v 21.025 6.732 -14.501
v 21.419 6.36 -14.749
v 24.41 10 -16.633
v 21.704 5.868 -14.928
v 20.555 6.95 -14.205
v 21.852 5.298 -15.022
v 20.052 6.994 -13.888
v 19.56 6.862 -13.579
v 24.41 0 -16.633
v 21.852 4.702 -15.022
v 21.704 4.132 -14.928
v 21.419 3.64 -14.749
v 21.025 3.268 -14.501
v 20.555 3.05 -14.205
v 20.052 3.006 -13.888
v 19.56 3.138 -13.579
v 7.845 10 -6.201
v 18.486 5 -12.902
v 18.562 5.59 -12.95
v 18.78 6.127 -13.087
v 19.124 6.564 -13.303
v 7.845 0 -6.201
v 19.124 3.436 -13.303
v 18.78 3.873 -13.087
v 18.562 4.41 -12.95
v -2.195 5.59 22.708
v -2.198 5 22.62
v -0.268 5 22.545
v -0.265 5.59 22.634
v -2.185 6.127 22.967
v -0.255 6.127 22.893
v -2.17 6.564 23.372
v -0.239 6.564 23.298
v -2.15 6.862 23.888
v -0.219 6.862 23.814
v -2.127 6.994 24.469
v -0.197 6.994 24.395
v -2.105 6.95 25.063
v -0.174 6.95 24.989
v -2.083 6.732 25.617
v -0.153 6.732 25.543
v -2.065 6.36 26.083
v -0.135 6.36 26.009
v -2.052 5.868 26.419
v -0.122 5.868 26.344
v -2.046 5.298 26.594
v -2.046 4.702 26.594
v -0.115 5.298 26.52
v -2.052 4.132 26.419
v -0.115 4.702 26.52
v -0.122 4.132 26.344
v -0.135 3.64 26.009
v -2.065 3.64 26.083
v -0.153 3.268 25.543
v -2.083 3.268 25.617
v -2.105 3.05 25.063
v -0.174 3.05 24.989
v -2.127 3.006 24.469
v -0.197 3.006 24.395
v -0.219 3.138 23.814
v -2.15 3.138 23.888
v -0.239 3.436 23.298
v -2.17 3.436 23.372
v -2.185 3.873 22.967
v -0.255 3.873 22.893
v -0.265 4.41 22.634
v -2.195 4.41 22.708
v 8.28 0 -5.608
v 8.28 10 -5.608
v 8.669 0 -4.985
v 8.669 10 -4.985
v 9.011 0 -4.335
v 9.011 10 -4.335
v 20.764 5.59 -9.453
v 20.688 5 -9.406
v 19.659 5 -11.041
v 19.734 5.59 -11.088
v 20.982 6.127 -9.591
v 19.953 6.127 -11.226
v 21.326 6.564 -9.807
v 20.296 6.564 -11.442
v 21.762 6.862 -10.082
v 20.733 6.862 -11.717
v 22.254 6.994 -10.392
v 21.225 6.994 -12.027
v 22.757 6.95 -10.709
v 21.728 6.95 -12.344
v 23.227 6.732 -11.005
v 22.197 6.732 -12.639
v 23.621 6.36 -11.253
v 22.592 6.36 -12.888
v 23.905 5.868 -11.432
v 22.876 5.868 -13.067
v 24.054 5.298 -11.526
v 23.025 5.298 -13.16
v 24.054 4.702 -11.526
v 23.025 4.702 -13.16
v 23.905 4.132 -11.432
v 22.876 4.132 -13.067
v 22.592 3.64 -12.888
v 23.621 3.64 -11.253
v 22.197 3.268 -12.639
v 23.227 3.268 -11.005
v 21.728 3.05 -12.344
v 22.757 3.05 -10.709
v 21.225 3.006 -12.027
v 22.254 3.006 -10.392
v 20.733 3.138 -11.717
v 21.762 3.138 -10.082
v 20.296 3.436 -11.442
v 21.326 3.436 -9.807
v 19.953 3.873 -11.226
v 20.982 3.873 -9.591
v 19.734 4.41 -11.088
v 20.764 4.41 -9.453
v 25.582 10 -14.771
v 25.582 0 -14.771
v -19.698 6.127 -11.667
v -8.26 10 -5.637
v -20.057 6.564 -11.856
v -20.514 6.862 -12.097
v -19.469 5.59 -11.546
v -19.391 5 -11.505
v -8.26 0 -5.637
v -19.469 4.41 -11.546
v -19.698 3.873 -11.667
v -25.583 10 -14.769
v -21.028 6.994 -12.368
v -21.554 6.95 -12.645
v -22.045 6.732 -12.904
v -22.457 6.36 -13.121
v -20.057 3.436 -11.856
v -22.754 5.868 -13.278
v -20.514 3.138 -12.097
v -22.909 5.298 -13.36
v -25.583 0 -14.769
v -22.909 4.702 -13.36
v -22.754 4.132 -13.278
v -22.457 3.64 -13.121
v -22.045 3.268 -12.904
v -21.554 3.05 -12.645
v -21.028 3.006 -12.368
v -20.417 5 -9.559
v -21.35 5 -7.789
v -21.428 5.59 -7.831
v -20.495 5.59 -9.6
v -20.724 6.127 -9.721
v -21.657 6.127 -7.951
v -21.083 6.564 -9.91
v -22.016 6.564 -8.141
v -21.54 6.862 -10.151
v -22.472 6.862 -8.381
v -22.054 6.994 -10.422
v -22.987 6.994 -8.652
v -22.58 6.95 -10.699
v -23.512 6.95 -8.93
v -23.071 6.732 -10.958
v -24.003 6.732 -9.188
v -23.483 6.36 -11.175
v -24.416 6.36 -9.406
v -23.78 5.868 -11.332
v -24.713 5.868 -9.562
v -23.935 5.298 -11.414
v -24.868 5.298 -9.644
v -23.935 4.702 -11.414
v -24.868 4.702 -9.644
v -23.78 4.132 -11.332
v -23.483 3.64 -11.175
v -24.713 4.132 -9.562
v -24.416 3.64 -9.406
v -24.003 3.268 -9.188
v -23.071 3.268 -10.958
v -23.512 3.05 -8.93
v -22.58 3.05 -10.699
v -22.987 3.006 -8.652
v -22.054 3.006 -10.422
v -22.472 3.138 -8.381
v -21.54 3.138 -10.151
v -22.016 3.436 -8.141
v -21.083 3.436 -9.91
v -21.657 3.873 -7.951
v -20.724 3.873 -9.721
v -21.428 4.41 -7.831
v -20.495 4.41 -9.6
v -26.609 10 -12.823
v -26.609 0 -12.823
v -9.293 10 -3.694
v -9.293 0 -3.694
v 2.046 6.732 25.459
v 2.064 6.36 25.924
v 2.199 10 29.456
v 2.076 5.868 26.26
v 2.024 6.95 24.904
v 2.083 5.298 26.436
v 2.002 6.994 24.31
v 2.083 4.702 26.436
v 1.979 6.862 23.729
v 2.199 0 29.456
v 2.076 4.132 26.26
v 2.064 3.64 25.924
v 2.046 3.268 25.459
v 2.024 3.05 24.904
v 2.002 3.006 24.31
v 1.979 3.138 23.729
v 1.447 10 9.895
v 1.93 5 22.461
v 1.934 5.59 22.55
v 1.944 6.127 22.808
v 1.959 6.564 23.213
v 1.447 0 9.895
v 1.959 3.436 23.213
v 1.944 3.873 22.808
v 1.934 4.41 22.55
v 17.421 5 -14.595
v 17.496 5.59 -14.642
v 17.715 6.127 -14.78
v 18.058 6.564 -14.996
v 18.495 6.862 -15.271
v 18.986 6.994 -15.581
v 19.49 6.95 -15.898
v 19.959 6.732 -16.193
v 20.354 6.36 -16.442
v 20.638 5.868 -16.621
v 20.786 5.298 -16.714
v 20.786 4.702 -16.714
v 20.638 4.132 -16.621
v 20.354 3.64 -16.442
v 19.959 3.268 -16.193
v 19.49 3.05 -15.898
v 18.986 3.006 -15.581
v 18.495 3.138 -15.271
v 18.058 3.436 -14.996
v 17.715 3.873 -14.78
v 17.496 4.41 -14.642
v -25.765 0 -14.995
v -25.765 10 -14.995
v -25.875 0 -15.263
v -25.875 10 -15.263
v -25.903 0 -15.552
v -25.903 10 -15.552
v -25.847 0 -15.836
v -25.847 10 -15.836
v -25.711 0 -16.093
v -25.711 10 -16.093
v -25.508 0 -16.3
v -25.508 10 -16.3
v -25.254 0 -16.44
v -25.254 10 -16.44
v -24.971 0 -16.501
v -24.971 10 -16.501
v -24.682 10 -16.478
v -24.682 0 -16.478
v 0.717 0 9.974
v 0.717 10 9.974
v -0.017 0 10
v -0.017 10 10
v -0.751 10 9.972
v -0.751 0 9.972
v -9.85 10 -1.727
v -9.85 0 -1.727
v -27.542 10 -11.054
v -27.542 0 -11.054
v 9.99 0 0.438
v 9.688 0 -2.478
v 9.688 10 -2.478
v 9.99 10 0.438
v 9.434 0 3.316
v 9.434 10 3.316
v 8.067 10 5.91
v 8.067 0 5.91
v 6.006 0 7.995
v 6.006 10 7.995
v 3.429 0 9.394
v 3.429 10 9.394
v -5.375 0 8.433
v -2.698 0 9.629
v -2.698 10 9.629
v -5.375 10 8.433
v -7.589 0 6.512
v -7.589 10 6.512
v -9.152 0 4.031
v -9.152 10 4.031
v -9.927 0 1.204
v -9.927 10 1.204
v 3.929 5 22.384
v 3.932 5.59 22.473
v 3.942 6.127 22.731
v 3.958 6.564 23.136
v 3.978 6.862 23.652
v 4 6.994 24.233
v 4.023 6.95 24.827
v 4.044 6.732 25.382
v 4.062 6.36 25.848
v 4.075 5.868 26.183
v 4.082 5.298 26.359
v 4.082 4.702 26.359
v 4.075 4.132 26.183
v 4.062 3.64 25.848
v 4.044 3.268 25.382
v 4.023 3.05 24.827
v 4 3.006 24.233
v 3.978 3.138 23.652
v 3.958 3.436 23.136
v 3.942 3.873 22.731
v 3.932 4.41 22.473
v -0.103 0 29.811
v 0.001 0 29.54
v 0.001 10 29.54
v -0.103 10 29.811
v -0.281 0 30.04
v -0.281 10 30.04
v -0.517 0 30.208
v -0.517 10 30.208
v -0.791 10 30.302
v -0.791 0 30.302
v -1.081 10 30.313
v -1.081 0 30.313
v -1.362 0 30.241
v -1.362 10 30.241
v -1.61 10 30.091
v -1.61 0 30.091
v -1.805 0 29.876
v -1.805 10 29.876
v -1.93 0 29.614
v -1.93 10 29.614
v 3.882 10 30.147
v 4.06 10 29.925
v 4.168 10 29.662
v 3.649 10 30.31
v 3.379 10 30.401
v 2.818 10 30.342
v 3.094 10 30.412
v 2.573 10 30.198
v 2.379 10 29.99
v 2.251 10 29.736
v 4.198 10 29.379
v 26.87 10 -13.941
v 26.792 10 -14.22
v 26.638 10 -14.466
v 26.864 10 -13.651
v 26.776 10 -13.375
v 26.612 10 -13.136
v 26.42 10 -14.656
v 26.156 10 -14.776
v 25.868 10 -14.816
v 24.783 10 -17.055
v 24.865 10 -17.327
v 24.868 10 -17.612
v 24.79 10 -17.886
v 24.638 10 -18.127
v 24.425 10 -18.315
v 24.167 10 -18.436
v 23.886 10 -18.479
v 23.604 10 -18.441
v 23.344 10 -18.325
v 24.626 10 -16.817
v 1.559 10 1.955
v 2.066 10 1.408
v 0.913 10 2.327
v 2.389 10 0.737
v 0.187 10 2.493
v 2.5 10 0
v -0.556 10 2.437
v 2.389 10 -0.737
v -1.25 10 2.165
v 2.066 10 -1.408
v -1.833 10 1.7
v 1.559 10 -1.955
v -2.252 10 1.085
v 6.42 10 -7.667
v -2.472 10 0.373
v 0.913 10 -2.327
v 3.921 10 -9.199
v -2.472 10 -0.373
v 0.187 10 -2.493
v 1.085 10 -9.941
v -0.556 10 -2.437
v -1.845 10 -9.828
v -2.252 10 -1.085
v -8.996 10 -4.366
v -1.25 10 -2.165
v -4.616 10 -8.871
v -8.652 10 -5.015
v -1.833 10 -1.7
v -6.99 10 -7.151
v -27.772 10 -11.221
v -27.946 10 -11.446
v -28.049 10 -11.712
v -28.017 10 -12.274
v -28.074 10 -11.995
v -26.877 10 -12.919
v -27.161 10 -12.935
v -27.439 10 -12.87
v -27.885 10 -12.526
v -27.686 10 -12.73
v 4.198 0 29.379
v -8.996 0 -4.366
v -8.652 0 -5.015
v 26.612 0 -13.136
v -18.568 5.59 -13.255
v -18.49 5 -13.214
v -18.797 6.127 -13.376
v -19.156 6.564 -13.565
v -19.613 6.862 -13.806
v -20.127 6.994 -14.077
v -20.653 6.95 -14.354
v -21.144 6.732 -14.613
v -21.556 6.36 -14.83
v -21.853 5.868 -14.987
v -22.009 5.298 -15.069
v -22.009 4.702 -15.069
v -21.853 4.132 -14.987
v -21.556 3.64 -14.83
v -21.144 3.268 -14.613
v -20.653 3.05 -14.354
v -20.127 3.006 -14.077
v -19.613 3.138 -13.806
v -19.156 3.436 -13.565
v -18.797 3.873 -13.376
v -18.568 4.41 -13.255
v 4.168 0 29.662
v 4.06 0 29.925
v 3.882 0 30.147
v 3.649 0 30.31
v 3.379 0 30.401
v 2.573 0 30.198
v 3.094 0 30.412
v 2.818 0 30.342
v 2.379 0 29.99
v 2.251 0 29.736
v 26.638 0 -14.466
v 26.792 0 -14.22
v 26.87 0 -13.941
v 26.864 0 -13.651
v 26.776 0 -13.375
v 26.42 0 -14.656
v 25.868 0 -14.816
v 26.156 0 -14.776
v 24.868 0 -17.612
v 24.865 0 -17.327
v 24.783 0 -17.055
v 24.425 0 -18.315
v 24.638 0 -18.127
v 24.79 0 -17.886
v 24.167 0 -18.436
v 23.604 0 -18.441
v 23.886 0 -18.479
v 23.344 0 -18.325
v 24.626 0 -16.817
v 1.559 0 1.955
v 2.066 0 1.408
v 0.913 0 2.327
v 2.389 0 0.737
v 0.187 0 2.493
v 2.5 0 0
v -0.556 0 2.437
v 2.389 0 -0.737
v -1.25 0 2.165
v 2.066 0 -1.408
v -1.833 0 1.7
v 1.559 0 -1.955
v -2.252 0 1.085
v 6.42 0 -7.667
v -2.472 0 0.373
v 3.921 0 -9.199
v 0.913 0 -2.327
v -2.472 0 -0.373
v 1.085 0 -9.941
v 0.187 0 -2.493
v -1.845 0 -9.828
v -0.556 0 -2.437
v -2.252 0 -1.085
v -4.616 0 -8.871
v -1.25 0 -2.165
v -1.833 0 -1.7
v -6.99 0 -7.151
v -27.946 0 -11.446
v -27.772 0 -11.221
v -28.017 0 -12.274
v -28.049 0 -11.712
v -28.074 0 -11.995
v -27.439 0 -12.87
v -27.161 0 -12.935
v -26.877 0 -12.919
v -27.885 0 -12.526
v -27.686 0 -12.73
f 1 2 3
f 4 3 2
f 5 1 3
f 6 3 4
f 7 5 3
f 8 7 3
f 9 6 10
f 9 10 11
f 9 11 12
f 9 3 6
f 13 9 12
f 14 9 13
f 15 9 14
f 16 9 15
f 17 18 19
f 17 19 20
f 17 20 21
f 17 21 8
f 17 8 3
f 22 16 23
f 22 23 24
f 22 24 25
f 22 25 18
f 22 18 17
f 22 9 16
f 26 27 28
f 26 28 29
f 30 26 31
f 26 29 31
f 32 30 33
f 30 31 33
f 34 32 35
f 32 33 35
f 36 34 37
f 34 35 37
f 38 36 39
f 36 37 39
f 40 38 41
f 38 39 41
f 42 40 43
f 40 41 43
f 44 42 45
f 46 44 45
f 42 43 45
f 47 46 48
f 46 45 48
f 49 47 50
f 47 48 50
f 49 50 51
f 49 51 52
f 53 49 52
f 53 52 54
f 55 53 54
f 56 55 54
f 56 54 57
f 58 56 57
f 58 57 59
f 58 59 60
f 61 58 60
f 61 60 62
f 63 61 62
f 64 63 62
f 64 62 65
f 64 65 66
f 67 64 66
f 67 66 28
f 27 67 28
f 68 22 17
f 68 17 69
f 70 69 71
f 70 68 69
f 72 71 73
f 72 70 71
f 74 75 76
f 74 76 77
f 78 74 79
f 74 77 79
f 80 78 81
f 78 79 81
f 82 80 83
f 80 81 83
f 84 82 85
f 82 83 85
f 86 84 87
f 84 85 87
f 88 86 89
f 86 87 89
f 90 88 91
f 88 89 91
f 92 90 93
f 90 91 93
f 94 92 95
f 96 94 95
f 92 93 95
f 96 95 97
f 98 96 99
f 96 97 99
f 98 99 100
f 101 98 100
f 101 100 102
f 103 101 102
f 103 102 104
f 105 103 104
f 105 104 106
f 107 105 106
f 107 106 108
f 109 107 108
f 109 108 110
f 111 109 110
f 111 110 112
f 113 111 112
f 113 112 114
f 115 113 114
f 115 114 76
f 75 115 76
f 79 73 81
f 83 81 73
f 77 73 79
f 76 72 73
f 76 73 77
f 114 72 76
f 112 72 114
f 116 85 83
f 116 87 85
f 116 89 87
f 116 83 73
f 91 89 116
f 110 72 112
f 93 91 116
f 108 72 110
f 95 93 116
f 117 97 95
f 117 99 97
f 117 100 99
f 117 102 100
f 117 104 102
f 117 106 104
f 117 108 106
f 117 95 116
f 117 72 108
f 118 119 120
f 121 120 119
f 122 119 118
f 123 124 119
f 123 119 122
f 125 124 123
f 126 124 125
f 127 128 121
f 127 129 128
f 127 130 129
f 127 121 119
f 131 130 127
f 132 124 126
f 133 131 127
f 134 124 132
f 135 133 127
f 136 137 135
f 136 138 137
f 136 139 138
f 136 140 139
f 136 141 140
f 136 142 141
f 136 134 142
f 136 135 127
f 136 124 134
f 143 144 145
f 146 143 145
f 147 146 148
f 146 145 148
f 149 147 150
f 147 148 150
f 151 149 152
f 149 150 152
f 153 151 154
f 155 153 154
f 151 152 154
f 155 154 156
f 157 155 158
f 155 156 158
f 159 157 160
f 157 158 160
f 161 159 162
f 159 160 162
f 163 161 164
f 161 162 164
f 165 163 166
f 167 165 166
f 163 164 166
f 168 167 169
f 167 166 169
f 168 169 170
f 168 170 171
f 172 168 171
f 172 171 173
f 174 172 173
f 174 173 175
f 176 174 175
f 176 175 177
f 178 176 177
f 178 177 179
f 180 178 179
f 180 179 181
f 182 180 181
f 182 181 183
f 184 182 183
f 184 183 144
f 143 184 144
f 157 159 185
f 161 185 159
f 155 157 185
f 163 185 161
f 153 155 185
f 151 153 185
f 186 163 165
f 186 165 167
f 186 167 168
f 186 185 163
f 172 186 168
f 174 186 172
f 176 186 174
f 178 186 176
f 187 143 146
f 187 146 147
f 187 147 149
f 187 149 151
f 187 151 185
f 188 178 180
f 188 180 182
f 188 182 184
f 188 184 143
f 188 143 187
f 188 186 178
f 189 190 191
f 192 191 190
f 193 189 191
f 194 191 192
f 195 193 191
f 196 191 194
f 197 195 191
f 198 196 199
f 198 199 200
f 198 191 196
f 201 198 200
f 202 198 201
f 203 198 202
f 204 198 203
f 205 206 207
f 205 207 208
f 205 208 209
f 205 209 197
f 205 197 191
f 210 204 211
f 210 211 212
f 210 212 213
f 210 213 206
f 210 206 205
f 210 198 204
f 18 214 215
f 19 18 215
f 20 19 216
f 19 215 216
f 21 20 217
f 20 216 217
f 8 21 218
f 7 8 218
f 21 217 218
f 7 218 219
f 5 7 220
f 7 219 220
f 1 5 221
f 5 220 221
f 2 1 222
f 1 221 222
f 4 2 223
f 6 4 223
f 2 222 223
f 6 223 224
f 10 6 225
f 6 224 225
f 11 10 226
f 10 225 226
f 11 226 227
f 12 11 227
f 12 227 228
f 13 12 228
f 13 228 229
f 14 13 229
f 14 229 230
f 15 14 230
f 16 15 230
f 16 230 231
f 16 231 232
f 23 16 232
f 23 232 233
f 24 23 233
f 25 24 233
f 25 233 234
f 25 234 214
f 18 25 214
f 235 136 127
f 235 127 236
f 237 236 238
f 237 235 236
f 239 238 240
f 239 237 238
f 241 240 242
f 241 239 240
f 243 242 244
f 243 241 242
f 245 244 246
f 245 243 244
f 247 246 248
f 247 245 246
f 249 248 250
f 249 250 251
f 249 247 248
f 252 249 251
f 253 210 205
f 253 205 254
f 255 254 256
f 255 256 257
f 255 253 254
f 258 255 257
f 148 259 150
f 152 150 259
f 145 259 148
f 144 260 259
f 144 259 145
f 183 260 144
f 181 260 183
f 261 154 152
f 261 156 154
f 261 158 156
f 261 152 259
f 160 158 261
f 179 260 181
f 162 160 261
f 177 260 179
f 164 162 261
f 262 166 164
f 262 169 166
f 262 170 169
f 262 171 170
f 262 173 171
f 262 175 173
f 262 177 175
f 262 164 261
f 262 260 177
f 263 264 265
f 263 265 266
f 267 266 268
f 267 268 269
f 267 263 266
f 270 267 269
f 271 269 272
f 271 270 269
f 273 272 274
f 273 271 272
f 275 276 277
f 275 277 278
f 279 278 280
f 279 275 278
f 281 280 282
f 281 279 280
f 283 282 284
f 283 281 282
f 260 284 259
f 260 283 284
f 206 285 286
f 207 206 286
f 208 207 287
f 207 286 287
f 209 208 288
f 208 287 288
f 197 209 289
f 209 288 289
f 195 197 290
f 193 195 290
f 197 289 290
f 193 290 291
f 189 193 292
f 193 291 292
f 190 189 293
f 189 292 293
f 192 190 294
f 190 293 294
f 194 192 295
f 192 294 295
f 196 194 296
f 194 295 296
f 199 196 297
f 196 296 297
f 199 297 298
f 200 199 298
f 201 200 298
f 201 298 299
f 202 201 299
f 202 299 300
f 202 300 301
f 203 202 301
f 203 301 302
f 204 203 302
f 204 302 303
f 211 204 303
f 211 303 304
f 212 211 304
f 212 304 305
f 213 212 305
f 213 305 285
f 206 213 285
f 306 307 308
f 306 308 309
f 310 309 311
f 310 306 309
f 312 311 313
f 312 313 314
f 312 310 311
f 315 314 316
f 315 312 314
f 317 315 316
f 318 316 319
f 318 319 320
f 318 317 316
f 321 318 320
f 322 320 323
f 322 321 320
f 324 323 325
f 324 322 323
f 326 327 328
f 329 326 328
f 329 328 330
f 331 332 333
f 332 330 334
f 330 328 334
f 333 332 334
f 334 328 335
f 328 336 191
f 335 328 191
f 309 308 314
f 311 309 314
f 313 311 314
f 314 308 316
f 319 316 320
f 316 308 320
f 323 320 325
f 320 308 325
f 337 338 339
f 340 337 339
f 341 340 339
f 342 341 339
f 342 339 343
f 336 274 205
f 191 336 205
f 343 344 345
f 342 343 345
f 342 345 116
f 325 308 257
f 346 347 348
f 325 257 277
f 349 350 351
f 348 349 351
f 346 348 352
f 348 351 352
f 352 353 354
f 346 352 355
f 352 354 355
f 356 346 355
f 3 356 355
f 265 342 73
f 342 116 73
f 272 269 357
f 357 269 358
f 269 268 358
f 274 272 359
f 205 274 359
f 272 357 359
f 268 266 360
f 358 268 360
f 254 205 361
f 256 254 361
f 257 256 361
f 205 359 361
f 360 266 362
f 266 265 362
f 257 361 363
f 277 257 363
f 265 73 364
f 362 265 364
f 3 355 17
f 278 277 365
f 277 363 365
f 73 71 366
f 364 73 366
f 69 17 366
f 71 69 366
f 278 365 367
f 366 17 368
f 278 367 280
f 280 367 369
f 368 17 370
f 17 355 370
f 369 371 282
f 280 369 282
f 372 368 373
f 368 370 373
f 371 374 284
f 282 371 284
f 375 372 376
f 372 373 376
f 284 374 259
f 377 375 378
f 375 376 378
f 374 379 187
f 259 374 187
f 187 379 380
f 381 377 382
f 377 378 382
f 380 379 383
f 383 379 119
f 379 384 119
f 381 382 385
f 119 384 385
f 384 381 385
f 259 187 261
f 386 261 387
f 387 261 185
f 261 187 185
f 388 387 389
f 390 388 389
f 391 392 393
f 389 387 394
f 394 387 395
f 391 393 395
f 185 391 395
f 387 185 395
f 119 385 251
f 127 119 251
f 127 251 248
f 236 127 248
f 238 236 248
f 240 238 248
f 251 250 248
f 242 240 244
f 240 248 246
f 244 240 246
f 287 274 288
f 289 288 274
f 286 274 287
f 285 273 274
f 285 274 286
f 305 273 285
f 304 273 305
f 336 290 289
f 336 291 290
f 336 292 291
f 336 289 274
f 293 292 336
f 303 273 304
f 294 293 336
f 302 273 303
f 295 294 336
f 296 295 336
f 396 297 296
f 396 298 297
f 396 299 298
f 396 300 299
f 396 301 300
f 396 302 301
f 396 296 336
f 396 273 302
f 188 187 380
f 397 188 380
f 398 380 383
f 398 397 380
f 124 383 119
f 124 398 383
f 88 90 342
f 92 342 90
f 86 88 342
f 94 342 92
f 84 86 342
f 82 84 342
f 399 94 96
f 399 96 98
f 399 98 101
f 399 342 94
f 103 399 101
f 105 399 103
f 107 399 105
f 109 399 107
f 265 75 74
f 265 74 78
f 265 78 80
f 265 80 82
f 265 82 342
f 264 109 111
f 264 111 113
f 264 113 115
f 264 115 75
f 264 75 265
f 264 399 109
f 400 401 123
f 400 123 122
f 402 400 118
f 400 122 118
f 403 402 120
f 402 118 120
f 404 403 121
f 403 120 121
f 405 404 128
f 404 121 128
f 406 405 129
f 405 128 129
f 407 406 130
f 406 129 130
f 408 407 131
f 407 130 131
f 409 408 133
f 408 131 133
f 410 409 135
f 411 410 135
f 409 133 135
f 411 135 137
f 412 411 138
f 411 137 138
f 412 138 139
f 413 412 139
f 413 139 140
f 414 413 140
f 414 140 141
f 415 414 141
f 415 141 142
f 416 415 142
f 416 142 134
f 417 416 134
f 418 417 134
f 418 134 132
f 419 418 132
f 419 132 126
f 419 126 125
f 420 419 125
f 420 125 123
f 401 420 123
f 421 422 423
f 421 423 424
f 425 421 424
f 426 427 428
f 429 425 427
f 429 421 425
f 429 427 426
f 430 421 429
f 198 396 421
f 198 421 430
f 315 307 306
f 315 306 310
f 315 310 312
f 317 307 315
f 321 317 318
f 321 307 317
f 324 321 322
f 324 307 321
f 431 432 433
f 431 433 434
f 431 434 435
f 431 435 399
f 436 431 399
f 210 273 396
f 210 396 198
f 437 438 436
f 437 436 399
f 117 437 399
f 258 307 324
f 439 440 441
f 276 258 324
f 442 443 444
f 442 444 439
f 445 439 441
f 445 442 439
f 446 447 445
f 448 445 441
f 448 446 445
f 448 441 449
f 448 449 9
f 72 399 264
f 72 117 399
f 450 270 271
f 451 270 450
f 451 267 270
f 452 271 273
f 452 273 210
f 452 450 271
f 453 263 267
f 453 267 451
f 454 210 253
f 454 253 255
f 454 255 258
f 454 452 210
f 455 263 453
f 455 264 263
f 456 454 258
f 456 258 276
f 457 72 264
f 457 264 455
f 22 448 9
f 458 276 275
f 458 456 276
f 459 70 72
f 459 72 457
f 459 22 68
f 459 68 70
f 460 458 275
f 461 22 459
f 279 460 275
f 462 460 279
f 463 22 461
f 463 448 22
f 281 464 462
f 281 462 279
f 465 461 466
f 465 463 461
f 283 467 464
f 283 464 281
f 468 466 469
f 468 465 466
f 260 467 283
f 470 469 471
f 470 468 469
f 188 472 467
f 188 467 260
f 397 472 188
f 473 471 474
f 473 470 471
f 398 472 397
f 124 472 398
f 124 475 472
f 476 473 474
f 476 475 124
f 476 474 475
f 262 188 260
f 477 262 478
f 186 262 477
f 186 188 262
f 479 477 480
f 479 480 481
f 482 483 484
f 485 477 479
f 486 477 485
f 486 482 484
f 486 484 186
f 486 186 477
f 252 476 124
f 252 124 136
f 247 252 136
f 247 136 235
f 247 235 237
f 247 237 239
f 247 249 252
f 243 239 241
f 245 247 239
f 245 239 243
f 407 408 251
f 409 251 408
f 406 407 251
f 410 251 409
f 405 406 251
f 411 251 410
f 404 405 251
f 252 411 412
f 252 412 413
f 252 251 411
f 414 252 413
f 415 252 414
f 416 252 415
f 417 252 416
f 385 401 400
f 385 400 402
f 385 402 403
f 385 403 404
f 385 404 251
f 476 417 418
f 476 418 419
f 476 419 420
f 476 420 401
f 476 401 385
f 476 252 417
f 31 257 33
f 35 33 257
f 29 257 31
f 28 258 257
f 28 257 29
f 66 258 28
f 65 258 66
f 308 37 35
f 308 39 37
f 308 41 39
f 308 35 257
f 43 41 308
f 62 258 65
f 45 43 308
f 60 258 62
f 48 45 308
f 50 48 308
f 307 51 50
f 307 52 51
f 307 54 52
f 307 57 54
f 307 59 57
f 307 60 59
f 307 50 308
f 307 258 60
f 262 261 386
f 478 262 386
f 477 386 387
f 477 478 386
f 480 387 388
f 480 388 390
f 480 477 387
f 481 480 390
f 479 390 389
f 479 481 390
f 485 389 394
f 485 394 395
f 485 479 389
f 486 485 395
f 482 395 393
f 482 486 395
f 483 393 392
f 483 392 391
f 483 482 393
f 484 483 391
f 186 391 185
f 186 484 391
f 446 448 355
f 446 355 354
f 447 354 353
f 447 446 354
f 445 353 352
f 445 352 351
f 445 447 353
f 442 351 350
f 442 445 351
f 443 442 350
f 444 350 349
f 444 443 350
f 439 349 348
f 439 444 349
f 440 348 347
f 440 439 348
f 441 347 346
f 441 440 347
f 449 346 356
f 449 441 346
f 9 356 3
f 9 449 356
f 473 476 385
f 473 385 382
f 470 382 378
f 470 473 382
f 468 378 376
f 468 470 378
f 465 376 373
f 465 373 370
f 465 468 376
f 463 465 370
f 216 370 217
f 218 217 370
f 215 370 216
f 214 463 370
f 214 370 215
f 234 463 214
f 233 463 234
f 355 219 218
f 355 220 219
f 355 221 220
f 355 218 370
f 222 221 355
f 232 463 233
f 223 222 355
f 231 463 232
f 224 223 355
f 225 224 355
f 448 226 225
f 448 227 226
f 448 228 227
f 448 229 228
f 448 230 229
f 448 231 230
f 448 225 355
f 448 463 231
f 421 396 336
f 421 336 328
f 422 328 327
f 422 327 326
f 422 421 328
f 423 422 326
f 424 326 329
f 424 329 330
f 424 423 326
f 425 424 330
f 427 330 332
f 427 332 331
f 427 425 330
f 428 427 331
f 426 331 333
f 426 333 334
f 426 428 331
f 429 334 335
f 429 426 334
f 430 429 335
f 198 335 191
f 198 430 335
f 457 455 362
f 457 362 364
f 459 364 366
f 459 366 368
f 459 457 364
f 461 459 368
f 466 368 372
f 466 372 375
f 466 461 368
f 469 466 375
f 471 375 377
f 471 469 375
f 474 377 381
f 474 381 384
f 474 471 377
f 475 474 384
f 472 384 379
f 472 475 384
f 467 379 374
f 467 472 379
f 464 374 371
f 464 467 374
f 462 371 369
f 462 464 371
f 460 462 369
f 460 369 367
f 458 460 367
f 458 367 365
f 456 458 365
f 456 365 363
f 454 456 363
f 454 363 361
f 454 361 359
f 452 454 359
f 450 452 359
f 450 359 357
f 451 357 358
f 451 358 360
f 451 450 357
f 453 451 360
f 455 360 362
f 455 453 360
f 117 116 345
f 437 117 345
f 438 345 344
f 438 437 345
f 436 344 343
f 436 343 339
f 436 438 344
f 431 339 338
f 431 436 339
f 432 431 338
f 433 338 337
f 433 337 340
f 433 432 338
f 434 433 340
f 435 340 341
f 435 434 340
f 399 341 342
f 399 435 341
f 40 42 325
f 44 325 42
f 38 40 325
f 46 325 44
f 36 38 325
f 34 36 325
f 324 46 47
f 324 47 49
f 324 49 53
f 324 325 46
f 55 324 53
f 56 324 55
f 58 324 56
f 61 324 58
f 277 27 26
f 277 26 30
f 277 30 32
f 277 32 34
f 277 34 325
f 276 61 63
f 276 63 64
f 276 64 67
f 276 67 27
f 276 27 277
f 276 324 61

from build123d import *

# Parameters (mm, degrees)
SKETCH1_R           = 2.5
BOSS_EXTRUDE1_DEPTH = 10
SKETCH2_R           = 2
CUT_EXTRUDE1_DEPTH  = 10
CIRPATTERN1_COUNT   = 3


with BuildPart() as part:
    # Sketch1 → Boss-Extrude1 (new body)
    with BuildSketch(Plane(origin=(0, 0, 0), x_dir=(1, 0, 0), z_dir=(0, 1, 0))):
        with BuildLine():
            Line((3.42943918, -9.393558799), (4.197898245, -29.378790113))
            ThreePointArc((4.197898245, -29.378790113), (3.237059632, -30.416474632), (2.199375114, -29.455636019))
            Line((2.199375114, -29.455636019), (1.447231615, -9.894721858))
            ThreePointArc((1.447231615, -9.894721858), (0.350023332, -9.993872306), (-0.751433173, -9.971727442))
            Line((-0.751433173, -9.971727442), (0.000999669, -29.540166516))
            ThreePointArc((0.000999669, -29.540166516), (-0.935779597, -30.318112399), (-1.929530696, -29.614398009))
            Line((-1.929530696, -29.614398009), (-2.697989761, -9.629166695))
            ThreePointArc((-2.697989761, -9.629166695), (-8.461744243, -5.329060364), (-9.849780142, 1.726797949))
            Line((-9.849780142, 1.726797949), (-27.541727692, 11.053908534))
            ThreePointArc((-27.541727692, 11.053908534), (-27.959969541, 12.404861441), (-26.609016634, 12.823103289))
            Line((-26.609016634, 12.823103289), (-9.2926963, 3.694021585))
            ThreePointArc((-9.2926963, 3.694021585), (-8.829958965, 4.693807055), (-8.260052699, 5.636623938))
            Line((-8.260052699, 5.636623938), (-25.58303447, 14.769217519))
            ThreePointArc((-25.58303447, 14.769217519), (-25.788365734, 15.969465103), (-24.682055646, 16.478221605))
            Line((-24.682055646, 16.478221605), (-6.990108095, 7.15111102))
            ThreePointArc((-6.990108095, 7.15111102), (-0.384229532, 9.992615657), (6.420340962, 7.66676085))
            Line((6.420340962, 7.66676085), (23.343829448, 18.324881579))
            ThreePointArc((23.343829448, 18.324881579), (24.722909908, 18.011613191), (24.40964152, 16.63253273))
            Line((24.40964152, 16.63253273), (7.845464685, 6.200700273))
            ThreePointArc((7.845464685, 6.200700273), (8.479935633, 5.300065251), (9.011485871, 4.335103505))
            Line((9.011485871, 4.335103505), (25.582034801, 14.770948997))
            ThreePointArc((25.582034801, 14.770948997), (26.724145331, 14.348647296), (26.611586342, 13.136176404))
            Line((26.611586342, 13.136176404), (9.688097856, 2.478055676))
            ThreePointArc((9.688097856, 2.478055676), (8.845973775, -4.663555293), (3.42943918, -9.393558799))
        make_face()
        Circle(SKETCH1_R, mode=Mode.SUBTRACT)
    extrude(amount=BOSS_EXTRUDE1_DEPTH)

    # Sketch2 → Cut-Extrude1 (cut)
    with BuildSketch(Plane(origin=(3.063714471, 0, -0.117803948), x_dir=(-0.038422953, 0, -0.999261566), z_dir=(0.999261566, 0, -0.038422953))):
        with Locations((-24.518391454, 5)):
            Circle(SKETCH2_R)
    cut_extrude1 = extrude(amount=-CUT_EXTRUDE1_DEPTH, mode=Mode.SUBTRACT)

    # CirPattern1: Cut-Extrude1 ×3 about axis
    cirpattern1_axis = Axis((0, 10, 0), (0, -1, 0))
    for i in range(1, CIRPATTERN1_COUNT):
        add(cut_extrude1.rotate(cirpattern1_axis, i * 360 / CIRPATTERN1_COUNT), mode=Mode.SUBTRACT)


solid = part.part
